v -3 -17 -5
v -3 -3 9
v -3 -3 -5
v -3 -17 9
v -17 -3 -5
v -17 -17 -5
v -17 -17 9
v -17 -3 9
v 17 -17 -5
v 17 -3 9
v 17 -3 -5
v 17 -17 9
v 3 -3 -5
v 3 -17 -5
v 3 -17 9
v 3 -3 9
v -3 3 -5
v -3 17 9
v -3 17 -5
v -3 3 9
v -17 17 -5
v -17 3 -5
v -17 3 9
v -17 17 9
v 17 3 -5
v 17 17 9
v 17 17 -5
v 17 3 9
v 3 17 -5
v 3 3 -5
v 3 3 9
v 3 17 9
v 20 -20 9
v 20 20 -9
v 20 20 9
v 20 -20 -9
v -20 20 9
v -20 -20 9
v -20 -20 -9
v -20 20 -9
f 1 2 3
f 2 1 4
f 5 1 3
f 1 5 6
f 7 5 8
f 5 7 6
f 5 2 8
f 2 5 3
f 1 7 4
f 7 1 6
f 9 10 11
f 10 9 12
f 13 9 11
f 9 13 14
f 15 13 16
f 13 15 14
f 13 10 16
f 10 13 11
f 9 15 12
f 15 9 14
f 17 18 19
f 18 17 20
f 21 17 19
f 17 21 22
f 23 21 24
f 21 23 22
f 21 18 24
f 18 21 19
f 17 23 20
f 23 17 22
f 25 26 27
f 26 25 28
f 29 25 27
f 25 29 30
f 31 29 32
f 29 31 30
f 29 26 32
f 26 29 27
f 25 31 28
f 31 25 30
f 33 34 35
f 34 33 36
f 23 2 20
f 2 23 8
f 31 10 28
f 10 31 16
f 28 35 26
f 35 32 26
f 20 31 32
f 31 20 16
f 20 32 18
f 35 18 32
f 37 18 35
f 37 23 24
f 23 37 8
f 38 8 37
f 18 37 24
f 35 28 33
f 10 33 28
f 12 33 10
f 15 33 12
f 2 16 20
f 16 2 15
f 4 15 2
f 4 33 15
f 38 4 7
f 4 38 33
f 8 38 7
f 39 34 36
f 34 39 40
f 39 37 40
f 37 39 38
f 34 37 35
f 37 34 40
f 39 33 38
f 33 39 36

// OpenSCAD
$fn = 32;

// ----------------------------------------------------------------------
// Pocket plate 40 x 40 x 18
// 2 x 2 pockets 14 mm square, 14 mm deep
// ----------------------------------------------------------------------

// --- parameters (mm) ---
thickness = 18;  // plate thickness
floor_t = 4;     // material left under each pocket
pocket = 14;     // pocket side length
pitch_x = 20;    // pocket pitch along X
pitch_y = 20;    // pocket pitch along Y
cols = 2;        // pockets per row
rows = 2;        // rows of pockets

// --- derived feature positions (mm) ---
depth = thickness - floor_t;        // = 14   pocket depth, down to the floor
span_x = (cols - 1) * pitch_x;      // = 20   distance between outer pockets
span_y = (rows - 1) * pitch_y;      // = 20   distance between outer pocket rows
origin_x = -span_x / 2;             // = -10   X of the first pocket
origin_y = -span_y / 2;             // = -10   Y of the first pocket
plate = [span_x + pocket + 6, span_y + pocket + 6, thickness];  // = [40, 40, 18]   overall size: pockets plus 3 mm of wall on each side
feature_centers = [
  [origin_x + 0 * pitch_x, origin_y + 0 * pitch_y],
  [origin_x + 1 * pitch_x, origin_y + 0 * pitch_y],
  [origin_x + 0 * pitch_x, origin_y + 1 * pitch_y],
  [origin_x + 1 * pitch_x, origin_y + 1 * pitch_y]
];   // pocket centres, used verbatim by the cutter loop

// plate outline, then one pocket per centre in feature_centers
difference() {
  cube(plate, center = true);
  for (centre = feature_centers)
    translate([centre[0] - pocket / 2, centre[1] - pocket / 2, plate[2] / 2 - depth])
      cube([pocket, pocket, depth + 1]);  // centred on the declared pocket centre
}
